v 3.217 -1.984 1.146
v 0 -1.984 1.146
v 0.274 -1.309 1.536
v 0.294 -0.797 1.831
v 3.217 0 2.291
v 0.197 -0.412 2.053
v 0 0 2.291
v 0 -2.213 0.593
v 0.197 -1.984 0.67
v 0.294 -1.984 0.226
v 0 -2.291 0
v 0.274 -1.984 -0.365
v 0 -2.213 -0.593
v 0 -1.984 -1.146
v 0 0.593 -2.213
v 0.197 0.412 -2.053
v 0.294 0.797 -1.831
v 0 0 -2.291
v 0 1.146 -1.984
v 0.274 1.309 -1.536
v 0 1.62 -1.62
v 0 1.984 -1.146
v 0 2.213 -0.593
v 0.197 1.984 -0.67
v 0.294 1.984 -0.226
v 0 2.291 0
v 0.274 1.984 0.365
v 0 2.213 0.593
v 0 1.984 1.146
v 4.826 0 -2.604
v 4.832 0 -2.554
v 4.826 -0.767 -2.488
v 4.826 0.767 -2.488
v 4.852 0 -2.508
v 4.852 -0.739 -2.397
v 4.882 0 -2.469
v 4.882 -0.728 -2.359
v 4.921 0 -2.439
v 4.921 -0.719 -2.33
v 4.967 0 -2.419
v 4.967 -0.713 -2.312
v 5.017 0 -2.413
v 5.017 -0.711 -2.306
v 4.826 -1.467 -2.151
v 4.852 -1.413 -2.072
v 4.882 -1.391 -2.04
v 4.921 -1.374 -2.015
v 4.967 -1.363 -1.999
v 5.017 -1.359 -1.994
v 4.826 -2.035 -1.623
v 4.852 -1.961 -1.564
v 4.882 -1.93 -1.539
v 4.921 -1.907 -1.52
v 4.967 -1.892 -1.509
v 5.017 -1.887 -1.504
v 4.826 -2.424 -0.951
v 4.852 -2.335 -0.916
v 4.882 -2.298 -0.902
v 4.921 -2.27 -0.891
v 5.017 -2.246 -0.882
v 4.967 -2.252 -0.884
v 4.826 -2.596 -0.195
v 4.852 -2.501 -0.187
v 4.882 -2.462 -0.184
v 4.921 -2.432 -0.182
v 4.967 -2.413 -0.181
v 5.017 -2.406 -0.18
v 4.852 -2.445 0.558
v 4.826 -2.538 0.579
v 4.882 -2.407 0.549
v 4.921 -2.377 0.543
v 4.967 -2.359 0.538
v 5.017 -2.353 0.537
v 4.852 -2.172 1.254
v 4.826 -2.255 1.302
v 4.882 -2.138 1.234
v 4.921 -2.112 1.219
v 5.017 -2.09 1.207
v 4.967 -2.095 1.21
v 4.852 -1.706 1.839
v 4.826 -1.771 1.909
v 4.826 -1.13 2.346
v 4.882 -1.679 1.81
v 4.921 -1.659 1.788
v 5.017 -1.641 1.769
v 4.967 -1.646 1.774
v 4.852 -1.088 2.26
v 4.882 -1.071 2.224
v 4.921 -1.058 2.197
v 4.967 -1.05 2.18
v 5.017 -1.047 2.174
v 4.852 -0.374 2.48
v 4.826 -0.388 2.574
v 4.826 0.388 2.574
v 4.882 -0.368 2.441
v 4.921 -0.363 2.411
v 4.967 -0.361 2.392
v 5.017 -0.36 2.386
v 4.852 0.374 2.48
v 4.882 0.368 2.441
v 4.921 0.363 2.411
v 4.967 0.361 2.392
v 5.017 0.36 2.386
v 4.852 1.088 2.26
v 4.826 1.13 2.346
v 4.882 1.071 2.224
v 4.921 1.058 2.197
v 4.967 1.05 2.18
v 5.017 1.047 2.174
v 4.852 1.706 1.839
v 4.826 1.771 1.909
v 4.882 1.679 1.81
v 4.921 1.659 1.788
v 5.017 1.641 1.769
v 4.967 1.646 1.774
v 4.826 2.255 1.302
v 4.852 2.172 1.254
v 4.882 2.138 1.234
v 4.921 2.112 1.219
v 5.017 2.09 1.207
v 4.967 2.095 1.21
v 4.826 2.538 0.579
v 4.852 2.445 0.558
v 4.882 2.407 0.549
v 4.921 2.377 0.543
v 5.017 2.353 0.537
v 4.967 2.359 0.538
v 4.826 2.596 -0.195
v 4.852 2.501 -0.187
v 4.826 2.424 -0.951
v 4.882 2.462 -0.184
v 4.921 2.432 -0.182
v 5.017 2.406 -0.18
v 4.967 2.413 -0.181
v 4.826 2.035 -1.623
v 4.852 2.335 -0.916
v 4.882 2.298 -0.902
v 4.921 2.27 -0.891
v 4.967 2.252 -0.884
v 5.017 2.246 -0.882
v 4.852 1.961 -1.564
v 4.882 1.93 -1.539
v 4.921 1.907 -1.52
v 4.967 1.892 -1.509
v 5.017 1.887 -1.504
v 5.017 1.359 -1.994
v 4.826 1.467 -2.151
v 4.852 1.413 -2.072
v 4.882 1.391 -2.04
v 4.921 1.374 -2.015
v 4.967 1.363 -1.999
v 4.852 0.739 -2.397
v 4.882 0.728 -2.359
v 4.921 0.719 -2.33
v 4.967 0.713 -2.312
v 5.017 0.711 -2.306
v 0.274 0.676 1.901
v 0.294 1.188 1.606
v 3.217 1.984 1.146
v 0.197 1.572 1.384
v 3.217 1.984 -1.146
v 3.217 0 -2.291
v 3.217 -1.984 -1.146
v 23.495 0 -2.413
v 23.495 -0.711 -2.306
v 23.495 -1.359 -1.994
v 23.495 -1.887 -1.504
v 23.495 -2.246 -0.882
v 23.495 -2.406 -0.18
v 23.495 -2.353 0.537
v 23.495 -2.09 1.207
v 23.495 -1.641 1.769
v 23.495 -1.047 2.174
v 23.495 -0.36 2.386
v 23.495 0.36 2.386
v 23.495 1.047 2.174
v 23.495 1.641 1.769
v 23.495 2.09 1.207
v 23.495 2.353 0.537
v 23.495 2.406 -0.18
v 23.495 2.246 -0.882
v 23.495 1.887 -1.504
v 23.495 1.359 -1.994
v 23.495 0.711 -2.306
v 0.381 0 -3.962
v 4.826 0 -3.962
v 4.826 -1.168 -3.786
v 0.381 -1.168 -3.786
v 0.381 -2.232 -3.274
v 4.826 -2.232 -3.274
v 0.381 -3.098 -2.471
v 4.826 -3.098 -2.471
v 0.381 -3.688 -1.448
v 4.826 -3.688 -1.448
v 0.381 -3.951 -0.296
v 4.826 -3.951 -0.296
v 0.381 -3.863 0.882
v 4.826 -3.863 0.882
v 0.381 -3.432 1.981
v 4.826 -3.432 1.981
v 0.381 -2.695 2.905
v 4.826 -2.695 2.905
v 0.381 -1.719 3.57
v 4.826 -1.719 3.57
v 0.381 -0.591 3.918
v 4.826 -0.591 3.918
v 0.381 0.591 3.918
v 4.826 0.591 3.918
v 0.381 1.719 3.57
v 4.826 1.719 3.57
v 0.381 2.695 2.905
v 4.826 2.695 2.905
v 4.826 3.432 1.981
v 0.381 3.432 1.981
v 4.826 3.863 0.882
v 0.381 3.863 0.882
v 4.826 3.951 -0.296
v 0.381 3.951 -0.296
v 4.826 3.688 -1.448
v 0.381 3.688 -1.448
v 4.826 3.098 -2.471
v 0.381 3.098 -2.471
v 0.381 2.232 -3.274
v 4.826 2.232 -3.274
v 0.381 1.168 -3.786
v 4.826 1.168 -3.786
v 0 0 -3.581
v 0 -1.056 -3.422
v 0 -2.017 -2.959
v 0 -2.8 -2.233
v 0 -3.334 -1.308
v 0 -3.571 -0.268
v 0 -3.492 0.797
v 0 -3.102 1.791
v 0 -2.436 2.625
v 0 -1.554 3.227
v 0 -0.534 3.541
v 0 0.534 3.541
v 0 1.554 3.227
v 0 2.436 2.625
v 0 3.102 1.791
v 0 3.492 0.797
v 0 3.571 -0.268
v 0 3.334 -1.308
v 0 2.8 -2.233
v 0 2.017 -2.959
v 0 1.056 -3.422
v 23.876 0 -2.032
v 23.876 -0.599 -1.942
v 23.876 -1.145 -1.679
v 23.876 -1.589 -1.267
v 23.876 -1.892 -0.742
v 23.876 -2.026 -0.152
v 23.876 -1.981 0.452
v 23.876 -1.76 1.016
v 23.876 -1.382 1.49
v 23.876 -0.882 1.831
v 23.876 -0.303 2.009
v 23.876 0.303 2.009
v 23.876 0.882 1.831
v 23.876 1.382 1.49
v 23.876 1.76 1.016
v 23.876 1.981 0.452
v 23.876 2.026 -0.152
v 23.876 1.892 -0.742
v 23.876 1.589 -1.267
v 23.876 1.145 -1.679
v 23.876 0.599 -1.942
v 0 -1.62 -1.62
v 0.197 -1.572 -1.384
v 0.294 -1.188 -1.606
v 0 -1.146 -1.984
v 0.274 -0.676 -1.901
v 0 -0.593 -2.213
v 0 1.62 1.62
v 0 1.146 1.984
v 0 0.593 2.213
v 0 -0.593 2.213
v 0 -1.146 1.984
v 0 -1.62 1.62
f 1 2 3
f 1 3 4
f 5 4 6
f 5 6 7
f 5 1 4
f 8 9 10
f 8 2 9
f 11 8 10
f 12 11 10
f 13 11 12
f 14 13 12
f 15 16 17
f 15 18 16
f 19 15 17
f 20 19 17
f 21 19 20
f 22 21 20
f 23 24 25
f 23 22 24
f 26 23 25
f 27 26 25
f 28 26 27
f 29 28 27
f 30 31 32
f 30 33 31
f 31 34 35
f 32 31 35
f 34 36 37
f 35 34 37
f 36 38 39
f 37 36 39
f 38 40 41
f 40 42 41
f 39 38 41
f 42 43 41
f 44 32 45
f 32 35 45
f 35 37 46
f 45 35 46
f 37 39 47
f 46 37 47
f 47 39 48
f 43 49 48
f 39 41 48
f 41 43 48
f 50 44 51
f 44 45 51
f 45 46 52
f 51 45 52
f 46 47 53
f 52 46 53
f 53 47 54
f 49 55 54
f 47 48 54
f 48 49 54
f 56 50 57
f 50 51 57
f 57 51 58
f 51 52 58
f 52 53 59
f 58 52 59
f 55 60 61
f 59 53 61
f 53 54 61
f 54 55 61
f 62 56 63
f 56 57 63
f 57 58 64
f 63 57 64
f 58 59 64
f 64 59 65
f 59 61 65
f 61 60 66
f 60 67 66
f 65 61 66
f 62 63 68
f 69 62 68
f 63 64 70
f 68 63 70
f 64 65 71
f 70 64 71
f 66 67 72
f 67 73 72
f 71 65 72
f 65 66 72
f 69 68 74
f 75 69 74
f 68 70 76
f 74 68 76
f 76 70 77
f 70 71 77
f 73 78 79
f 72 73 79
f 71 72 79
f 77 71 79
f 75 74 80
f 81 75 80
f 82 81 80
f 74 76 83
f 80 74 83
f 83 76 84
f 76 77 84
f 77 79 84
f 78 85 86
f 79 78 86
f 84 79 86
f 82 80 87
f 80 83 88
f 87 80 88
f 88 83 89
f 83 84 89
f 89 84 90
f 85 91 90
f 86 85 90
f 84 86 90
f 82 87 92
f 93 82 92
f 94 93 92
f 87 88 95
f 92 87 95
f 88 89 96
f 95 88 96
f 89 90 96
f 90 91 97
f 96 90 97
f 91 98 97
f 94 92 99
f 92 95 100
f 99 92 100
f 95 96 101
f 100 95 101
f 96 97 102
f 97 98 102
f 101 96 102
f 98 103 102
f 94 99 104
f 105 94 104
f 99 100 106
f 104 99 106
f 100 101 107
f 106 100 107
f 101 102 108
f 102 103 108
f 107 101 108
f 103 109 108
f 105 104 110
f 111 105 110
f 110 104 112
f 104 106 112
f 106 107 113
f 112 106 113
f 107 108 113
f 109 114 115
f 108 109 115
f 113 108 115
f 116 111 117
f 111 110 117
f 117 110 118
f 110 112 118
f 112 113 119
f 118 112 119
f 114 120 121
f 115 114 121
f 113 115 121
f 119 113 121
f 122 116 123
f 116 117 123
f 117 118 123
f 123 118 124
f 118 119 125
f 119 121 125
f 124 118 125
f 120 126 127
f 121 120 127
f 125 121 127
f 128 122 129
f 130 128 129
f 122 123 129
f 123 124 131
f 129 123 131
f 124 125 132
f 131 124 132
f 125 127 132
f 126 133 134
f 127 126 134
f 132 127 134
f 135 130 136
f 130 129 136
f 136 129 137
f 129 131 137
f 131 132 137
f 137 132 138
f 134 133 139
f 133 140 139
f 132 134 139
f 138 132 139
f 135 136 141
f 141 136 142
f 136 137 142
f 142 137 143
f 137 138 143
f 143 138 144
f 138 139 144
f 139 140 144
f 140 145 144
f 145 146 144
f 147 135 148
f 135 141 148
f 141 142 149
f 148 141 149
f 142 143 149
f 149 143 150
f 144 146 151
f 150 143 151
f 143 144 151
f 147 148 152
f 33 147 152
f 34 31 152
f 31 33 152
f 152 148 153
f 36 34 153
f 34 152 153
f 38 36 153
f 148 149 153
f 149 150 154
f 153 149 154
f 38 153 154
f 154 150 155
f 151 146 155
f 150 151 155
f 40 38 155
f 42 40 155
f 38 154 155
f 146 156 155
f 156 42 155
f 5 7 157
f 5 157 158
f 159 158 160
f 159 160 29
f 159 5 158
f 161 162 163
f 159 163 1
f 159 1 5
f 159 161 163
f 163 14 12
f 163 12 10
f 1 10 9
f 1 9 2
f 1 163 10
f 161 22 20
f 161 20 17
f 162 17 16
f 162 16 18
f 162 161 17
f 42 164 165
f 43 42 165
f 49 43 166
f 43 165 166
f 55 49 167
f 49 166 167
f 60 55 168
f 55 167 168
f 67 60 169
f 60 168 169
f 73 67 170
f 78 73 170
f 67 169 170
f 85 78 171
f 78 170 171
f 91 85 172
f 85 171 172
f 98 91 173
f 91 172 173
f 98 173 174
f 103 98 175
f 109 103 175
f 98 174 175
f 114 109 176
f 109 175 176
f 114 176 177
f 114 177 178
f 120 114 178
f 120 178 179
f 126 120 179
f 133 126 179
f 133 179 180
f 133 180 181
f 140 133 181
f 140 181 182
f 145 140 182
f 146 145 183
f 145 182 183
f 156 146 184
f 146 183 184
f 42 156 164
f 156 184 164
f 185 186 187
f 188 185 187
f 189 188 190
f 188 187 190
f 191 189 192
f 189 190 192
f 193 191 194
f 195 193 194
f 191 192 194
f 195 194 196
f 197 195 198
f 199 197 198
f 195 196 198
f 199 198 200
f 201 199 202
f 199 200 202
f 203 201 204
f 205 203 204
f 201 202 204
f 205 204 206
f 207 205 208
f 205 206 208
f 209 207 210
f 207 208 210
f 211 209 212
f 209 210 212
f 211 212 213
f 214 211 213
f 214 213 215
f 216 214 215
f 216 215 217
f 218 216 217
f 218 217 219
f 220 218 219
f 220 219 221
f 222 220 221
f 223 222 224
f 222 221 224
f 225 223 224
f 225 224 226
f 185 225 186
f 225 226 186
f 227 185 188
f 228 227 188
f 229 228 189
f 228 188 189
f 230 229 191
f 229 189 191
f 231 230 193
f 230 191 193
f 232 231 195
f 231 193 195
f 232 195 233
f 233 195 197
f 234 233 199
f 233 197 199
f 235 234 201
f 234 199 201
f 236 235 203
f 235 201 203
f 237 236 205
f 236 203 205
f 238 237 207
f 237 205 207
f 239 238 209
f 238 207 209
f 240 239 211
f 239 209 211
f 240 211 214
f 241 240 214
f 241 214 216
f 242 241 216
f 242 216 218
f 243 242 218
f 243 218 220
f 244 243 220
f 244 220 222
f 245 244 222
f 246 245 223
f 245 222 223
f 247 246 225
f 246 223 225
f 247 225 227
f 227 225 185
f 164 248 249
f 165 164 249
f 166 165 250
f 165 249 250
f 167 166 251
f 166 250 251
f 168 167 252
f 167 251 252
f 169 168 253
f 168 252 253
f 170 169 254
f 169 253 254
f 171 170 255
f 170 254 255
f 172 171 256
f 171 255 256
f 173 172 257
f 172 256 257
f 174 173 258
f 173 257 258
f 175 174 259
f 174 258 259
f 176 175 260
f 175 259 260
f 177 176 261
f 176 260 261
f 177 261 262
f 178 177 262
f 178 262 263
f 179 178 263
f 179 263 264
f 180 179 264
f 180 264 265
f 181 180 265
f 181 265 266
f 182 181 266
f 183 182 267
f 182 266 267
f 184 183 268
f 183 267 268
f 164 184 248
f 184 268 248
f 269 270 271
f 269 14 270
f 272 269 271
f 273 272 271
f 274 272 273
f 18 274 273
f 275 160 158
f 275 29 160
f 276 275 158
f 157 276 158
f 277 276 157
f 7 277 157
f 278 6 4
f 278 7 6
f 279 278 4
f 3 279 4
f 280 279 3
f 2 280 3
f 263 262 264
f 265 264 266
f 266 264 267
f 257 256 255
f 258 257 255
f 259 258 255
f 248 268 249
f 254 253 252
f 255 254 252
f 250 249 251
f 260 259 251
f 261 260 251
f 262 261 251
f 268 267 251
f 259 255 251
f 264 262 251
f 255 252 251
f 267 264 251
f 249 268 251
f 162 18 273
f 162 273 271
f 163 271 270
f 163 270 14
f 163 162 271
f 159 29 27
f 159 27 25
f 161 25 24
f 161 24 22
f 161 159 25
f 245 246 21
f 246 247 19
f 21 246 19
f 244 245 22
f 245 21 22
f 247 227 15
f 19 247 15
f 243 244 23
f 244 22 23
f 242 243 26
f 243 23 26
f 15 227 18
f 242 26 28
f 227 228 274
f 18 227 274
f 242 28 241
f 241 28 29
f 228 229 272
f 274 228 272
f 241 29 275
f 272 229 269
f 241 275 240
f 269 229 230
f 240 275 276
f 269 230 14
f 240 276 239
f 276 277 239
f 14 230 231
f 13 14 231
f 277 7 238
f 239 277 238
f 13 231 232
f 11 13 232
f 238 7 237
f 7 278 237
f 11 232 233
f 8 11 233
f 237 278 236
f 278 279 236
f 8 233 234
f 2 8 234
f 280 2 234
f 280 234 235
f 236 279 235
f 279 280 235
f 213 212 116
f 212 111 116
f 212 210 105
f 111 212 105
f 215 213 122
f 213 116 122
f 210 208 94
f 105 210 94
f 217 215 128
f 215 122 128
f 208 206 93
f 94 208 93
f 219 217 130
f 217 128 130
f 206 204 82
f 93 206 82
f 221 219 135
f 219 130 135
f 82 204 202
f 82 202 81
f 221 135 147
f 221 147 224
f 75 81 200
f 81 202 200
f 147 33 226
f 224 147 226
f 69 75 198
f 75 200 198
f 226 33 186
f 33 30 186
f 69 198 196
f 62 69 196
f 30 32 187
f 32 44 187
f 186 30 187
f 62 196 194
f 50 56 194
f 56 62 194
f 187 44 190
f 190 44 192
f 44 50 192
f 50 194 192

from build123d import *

# Parameters (mm, degrees)
HEX_START         = -3.217333
HEX_2_DEPTH       = 3.217333
CHAMFER1_SIZE     = 0.381
FILLET1_R         = 0.1905
SKETCH3_R         = 2.291358881
HEX_CHAMFER_DEPTH = 2.54
HEX_CHAMFER_DRAFT = 45


with BuildPart() as part:
    # Sketch1 → Body (revolve)
    with BuildSketch(Plane(origin=(0, 0, 0), x_dir=(1, 0, 0), z_dir=(0, 1, 0))):
        Polygon((0, 0), (0, 3.9624), (4.826, 3.9624), (4.826, 2.413), (23.876, 2.413), (23.876, 0), align=None)
    revolve(axis=Axis((23.876, 0, 0), (-1, 0, 0)))

    # Sketch2 → Hex 2 (cut)
    with BuildSketch(Plane.ZY.offset(HEX_START)):
        Polygon((-2.291358881, 0), (-1.14567944, -1.984375), (1.14567944, -1.984375), (2.291358881, 0), (1.14567944, 1.984375), (-1.14567944, 1.984375), align=None)
    extrude(amount=HEX_2_DEPTH, mode=Mode.SUBTRACT)

    # Chamfer1
    chamfer1_edges = [part.edges().sort_by_distance(p)[0] for p in [
        (0, 0, 3.9624),
        (23.876, 0, 2.413),
    ]]
    chamfer(chamfer1_edges, length=CHAMFER1_SIZE)

    # Fillet1
    fillet1_edges = [part.edges().sort_by_distance(p)[0] for p in [
        (4.826, 0, 2.413),
    ]]
    fillet(fillet1_edges, radius=FILLET1_R)


with BuildPart() as hex_chamfer_tool:
    # Sketch3 → Hex Chamfer (with draft: the straight prism first)
    with BuildSketch(Plane(origin=(0, 0, 0), x_dir=(0, 0, -1), z_dir=(1, 0, 0))):
        Circle(SKETCH3_R)
    extrude(amount=HEX_CHAMFER_DEPTH)
    # Hex Chamfer: the draft: its side faces are tilted about the plane it starts from
    hex_chamfer_sides = [hex_chamfer_tool.faces().sort_by_distance(p)[0] for p in [
        (1.27, 0, 2.291358881),
    ]]
    draft(hex_chamfer_sides, Plane(origin=(0, 0, 0), x_dir=(0, 0, -1), z_dir=(1, 0, 0)), HEX_CHAMFER_DRAFT)


with BuildPart() as part_1:
    add(part.part)

    # Hex Chamfer: cut by hex_chamfer_tool
    add(hex_chamfer_tool.part, mode=Mode.SUBTRACT)


solid = part_1.part
